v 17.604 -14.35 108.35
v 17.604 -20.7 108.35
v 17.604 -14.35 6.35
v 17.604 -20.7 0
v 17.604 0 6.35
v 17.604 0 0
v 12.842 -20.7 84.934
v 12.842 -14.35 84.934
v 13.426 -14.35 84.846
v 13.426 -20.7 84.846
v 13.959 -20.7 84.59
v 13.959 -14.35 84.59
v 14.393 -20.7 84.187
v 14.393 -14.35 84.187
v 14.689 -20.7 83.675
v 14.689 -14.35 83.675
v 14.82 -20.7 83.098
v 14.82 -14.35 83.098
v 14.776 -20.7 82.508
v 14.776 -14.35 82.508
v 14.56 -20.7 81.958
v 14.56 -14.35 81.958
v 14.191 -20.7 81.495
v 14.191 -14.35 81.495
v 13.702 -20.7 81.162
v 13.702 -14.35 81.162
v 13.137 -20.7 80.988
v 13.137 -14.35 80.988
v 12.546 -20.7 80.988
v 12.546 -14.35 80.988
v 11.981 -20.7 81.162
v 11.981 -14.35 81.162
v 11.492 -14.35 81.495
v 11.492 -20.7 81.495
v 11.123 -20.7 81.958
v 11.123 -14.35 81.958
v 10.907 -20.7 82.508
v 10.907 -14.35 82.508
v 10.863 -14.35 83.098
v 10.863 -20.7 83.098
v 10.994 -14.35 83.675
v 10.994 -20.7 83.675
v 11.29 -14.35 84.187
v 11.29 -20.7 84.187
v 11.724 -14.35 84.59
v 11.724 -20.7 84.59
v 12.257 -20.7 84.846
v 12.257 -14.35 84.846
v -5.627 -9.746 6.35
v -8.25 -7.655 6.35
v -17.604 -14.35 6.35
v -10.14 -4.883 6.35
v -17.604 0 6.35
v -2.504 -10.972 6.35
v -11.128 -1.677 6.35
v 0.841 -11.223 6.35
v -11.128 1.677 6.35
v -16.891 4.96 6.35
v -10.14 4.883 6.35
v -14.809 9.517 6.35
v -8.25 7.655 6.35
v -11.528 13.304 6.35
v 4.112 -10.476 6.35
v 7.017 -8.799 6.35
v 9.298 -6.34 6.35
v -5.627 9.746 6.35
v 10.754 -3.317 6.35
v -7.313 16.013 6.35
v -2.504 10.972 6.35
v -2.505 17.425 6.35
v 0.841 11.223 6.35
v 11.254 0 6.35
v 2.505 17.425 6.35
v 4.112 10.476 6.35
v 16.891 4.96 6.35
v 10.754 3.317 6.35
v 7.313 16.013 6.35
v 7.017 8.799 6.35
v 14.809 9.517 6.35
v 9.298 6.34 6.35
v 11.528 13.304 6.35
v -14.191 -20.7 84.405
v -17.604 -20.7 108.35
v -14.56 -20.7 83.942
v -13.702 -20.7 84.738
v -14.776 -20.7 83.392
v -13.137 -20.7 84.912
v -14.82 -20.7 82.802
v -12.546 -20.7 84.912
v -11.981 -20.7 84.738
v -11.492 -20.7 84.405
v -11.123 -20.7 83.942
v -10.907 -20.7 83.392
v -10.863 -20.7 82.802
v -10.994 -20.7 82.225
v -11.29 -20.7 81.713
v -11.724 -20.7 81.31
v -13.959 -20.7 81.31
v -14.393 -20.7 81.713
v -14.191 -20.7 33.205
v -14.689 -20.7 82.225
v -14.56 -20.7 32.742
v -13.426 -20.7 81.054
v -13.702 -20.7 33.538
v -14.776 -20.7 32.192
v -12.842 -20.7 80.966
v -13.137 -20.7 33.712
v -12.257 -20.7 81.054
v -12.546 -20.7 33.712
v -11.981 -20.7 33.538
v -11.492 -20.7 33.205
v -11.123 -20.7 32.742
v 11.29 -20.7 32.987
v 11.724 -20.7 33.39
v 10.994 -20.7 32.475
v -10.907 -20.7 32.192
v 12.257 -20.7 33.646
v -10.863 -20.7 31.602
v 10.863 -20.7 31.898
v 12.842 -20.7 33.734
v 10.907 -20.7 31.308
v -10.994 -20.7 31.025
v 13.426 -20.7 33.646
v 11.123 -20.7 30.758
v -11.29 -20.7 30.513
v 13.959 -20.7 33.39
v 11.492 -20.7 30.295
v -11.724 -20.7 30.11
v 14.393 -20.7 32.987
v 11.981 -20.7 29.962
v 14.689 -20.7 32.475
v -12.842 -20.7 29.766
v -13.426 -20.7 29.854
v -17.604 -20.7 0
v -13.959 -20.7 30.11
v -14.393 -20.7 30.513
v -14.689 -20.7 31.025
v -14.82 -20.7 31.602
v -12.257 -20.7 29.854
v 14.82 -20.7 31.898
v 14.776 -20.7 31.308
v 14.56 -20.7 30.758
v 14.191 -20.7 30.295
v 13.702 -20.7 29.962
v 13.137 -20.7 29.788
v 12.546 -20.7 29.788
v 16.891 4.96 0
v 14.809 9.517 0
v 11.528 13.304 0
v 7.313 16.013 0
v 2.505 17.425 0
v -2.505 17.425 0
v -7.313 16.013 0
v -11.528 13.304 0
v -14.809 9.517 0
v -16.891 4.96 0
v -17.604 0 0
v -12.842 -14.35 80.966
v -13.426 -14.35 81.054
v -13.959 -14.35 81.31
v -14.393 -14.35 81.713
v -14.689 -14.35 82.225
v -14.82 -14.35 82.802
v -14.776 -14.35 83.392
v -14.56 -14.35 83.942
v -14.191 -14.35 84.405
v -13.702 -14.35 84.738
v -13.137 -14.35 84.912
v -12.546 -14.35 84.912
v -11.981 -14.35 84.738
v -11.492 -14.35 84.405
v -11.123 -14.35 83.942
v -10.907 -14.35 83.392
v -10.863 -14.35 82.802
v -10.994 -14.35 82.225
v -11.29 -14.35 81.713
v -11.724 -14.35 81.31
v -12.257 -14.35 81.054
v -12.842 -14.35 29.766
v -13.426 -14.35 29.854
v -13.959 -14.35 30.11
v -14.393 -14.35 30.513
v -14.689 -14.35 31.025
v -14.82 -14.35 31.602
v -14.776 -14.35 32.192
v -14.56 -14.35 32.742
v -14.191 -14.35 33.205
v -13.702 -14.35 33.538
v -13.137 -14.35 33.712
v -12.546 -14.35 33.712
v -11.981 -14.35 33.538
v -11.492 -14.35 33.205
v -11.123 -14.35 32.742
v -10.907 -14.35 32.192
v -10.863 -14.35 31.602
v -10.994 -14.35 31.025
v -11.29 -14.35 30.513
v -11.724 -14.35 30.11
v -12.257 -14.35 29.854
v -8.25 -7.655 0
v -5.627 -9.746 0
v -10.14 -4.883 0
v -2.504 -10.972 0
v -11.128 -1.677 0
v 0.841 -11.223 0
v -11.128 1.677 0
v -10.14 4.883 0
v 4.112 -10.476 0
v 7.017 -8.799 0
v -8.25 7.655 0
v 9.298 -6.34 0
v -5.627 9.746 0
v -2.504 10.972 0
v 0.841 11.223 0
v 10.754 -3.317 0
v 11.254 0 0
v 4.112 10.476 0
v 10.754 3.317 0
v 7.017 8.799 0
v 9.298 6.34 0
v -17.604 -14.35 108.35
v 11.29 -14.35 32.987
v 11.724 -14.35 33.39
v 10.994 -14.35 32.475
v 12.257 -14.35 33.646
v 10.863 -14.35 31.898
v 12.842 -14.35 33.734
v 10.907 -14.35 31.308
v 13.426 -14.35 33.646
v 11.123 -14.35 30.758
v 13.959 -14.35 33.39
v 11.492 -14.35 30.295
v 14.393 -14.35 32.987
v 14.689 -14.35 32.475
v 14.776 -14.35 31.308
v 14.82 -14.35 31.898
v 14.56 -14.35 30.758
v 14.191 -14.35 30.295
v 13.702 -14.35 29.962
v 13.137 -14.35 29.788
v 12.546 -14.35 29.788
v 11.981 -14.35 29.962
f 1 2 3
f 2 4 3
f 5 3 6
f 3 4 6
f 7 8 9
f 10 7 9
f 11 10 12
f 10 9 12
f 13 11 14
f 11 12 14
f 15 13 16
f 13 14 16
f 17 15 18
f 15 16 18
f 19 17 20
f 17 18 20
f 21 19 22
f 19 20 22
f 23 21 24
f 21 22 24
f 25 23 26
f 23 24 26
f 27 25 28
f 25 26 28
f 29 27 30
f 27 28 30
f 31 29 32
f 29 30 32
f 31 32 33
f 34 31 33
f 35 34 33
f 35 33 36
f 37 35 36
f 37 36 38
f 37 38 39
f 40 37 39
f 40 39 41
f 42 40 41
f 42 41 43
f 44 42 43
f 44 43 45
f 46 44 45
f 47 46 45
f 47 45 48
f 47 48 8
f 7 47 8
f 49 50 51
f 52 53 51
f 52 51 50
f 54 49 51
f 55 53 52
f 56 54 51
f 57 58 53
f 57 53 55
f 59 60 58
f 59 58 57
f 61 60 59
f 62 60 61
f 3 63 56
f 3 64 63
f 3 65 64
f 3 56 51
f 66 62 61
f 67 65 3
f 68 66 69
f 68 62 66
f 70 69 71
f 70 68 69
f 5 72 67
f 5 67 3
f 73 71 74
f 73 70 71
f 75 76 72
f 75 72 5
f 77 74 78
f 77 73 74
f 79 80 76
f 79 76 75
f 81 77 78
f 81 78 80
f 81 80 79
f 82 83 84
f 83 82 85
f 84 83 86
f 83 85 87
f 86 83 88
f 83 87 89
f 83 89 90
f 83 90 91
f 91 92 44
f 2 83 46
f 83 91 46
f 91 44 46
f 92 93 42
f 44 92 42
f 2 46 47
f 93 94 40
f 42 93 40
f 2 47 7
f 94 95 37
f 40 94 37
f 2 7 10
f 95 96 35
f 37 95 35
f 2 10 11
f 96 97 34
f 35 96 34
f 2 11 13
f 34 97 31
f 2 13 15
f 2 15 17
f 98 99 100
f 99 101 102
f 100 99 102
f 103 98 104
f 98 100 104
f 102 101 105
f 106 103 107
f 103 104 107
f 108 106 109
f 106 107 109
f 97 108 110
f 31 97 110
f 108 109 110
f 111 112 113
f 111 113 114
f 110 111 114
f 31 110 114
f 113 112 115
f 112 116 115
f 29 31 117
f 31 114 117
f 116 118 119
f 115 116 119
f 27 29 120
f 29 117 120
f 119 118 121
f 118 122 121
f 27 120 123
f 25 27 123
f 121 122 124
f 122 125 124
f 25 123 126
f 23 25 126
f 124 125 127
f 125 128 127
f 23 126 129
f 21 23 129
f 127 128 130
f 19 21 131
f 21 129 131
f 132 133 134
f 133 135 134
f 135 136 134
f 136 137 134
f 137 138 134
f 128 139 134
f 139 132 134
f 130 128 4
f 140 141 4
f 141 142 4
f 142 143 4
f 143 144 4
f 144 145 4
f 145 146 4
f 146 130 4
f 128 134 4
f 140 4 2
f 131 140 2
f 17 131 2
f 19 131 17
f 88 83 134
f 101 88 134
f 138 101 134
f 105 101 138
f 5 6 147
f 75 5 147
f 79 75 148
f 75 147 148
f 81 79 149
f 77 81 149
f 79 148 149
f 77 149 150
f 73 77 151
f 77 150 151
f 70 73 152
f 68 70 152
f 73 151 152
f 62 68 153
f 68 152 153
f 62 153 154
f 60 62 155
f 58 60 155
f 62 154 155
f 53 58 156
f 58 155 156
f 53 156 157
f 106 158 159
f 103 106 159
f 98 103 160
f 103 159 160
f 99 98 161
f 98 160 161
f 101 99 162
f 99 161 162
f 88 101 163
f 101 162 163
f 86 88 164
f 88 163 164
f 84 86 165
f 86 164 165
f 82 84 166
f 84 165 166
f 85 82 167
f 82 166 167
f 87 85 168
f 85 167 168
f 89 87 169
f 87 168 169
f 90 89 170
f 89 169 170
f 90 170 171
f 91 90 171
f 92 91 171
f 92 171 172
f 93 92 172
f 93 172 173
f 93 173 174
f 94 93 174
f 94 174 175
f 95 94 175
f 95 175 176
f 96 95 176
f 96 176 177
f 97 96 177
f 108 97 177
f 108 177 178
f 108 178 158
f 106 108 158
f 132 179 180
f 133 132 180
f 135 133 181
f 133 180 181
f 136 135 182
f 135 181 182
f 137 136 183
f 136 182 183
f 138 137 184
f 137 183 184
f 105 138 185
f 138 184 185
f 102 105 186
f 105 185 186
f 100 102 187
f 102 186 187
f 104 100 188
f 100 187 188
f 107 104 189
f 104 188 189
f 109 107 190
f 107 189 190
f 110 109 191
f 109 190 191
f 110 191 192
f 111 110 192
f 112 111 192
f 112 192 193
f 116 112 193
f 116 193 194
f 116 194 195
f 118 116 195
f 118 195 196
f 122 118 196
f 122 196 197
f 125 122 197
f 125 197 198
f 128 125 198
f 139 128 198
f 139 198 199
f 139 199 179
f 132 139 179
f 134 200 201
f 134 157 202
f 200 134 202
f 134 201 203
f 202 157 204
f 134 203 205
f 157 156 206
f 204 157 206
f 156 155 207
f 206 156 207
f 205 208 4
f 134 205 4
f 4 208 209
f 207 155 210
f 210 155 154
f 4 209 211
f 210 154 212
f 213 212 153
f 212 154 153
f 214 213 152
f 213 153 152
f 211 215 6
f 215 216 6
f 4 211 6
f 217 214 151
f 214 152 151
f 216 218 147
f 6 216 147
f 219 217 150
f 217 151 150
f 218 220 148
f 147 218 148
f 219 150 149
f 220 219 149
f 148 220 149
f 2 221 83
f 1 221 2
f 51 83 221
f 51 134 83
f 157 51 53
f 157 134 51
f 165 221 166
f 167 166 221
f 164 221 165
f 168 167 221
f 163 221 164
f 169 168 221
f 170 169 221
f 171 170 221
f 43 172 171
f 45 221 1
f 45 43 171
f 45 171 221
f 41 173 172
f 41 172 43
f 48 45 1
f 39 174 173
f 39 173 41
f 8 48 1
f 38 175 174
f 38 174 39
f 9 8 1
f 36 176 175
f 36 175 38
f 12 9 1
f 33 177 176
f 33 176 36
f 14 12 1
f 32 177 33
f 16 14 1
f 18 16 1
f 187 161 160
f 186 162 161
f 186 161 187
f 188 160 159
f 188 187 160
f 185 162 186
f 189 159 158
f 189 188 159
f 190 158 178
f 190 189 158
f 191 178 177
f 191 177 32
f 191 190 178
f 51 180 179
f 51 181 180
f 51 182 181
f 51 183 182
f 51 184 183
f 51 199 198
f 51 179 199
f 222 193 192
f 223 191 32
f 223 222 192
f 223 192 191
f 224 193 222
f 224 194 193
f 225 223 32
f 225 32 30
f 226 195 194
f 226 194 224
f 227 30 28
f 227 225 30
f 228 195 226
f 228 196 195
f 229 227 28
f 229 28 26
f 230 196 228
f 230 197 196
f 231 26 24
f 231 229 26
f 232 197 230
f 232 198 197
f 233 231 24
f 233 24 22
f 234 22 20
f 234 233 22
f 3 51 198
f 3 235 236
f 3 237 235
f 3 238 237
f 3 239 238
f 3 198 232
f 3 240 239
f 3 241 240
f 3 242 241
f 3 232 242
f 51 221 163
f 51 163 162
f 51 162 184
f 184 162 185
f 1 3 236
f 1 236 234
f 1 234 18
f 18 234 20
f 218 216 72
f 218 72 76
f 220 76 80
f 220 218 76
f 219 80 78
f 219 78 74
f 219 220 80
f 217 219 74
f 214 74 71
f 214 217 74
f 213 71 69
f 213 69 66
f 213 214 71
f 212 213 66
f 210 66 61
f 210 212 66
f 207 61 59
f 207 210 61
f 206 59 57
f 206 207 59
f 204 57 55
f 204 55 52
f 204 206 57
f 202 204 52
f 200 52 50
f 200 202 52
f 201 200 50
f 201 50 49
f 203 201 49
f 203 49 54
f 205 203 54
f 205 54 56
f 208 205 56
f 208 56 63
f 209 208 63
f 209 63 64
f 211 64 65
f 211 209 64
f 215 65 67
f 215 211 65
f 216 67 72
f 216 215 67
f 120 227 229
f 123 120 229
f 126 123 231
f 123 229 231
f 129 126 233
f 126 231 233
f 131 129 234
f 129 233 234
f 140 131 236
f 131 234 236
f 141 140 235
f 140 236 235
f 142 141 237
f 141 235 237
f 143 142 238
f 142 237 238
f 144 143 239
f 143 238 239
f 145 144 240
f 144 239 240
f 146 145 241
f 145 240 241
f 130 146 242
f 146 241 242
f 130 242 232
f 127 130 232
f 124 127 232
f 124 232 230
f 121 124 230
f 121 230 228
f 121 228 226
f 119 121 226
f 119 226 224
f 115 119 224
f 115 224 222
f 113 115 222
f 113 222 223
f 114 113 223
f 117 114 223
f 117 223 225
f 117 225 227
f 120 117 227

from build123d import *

# Parameters (mm, degrees)
SKETCH1_R           = 11.254
BOSS_EXTRUDE1_DEPTH = 6.35
SKETCH2_W           = 35.208
SKETCH2_H           = 6.35
BOSS_EXTRUDE2_DEPTH = 102
SKETCH3_R           = 1.984375
CUT_EXTRUDE1_DEPTH  = 115.327080921


with BuildPart() as part:
    # Sketch1 → Boss-Extrude1 (new body)
    with BuildSketch(Plane.XY):
        with BuildLine():
            Line((-17.604, 0), (-17.604, -20.7))
            Line((-17.604, -20.7), (17.604, -20.7))
            Line((17.604, -20.7), (17.604, 0))
            ThreePointArc((17.604, 0), (0, 17.604), (-17.604, 0))
        make_face()
        Circle(SKETCH1_R, mode=Mode.SUBTRACT)
    extrude(amount=BOSS_EXTRUDE1_DEPTH)

    # Sketch2 → Boss-Extrude2 (add)
    with BuildSketch(Plane.XY.offset(6.35)):
        with Locations((0, -17.525)):
            Rectangle(SKETCH2_W, SKETCH2_H)
    extrude(amount=BOSS_EXTRUDE2_DEPTH)

    # Sketch3 → Cut-Extrude1 (cut, through all)
    with BuildSketch(Plane(origin=(0, -14.35, 0), x_dir=(1, 0, 0), z_dir=(0, 1, 0))):
        with Locations(Location((12.8415, -31.75, 0), (0, 0, 270))):
            Circle(SKETCH3_R)
        with Locations(Location((12.8415, -82.95, 0), (0, 0, 270))):
            Circle(SKETCH3_R)
        with Locations(Location((-12.8415, -82.95, 0), (0, 0, 90))):
            Circle(SKETCH3_R)
        with Locations(Location((-12.8415, -31.75, 0), (0, 0, 90))):
            Circle(SKETCH3_R)
    extrude(amount=-CUT_EXTRUDE1_DEPTH, mode=Mode.SUBTRACT)


solid = part.part
